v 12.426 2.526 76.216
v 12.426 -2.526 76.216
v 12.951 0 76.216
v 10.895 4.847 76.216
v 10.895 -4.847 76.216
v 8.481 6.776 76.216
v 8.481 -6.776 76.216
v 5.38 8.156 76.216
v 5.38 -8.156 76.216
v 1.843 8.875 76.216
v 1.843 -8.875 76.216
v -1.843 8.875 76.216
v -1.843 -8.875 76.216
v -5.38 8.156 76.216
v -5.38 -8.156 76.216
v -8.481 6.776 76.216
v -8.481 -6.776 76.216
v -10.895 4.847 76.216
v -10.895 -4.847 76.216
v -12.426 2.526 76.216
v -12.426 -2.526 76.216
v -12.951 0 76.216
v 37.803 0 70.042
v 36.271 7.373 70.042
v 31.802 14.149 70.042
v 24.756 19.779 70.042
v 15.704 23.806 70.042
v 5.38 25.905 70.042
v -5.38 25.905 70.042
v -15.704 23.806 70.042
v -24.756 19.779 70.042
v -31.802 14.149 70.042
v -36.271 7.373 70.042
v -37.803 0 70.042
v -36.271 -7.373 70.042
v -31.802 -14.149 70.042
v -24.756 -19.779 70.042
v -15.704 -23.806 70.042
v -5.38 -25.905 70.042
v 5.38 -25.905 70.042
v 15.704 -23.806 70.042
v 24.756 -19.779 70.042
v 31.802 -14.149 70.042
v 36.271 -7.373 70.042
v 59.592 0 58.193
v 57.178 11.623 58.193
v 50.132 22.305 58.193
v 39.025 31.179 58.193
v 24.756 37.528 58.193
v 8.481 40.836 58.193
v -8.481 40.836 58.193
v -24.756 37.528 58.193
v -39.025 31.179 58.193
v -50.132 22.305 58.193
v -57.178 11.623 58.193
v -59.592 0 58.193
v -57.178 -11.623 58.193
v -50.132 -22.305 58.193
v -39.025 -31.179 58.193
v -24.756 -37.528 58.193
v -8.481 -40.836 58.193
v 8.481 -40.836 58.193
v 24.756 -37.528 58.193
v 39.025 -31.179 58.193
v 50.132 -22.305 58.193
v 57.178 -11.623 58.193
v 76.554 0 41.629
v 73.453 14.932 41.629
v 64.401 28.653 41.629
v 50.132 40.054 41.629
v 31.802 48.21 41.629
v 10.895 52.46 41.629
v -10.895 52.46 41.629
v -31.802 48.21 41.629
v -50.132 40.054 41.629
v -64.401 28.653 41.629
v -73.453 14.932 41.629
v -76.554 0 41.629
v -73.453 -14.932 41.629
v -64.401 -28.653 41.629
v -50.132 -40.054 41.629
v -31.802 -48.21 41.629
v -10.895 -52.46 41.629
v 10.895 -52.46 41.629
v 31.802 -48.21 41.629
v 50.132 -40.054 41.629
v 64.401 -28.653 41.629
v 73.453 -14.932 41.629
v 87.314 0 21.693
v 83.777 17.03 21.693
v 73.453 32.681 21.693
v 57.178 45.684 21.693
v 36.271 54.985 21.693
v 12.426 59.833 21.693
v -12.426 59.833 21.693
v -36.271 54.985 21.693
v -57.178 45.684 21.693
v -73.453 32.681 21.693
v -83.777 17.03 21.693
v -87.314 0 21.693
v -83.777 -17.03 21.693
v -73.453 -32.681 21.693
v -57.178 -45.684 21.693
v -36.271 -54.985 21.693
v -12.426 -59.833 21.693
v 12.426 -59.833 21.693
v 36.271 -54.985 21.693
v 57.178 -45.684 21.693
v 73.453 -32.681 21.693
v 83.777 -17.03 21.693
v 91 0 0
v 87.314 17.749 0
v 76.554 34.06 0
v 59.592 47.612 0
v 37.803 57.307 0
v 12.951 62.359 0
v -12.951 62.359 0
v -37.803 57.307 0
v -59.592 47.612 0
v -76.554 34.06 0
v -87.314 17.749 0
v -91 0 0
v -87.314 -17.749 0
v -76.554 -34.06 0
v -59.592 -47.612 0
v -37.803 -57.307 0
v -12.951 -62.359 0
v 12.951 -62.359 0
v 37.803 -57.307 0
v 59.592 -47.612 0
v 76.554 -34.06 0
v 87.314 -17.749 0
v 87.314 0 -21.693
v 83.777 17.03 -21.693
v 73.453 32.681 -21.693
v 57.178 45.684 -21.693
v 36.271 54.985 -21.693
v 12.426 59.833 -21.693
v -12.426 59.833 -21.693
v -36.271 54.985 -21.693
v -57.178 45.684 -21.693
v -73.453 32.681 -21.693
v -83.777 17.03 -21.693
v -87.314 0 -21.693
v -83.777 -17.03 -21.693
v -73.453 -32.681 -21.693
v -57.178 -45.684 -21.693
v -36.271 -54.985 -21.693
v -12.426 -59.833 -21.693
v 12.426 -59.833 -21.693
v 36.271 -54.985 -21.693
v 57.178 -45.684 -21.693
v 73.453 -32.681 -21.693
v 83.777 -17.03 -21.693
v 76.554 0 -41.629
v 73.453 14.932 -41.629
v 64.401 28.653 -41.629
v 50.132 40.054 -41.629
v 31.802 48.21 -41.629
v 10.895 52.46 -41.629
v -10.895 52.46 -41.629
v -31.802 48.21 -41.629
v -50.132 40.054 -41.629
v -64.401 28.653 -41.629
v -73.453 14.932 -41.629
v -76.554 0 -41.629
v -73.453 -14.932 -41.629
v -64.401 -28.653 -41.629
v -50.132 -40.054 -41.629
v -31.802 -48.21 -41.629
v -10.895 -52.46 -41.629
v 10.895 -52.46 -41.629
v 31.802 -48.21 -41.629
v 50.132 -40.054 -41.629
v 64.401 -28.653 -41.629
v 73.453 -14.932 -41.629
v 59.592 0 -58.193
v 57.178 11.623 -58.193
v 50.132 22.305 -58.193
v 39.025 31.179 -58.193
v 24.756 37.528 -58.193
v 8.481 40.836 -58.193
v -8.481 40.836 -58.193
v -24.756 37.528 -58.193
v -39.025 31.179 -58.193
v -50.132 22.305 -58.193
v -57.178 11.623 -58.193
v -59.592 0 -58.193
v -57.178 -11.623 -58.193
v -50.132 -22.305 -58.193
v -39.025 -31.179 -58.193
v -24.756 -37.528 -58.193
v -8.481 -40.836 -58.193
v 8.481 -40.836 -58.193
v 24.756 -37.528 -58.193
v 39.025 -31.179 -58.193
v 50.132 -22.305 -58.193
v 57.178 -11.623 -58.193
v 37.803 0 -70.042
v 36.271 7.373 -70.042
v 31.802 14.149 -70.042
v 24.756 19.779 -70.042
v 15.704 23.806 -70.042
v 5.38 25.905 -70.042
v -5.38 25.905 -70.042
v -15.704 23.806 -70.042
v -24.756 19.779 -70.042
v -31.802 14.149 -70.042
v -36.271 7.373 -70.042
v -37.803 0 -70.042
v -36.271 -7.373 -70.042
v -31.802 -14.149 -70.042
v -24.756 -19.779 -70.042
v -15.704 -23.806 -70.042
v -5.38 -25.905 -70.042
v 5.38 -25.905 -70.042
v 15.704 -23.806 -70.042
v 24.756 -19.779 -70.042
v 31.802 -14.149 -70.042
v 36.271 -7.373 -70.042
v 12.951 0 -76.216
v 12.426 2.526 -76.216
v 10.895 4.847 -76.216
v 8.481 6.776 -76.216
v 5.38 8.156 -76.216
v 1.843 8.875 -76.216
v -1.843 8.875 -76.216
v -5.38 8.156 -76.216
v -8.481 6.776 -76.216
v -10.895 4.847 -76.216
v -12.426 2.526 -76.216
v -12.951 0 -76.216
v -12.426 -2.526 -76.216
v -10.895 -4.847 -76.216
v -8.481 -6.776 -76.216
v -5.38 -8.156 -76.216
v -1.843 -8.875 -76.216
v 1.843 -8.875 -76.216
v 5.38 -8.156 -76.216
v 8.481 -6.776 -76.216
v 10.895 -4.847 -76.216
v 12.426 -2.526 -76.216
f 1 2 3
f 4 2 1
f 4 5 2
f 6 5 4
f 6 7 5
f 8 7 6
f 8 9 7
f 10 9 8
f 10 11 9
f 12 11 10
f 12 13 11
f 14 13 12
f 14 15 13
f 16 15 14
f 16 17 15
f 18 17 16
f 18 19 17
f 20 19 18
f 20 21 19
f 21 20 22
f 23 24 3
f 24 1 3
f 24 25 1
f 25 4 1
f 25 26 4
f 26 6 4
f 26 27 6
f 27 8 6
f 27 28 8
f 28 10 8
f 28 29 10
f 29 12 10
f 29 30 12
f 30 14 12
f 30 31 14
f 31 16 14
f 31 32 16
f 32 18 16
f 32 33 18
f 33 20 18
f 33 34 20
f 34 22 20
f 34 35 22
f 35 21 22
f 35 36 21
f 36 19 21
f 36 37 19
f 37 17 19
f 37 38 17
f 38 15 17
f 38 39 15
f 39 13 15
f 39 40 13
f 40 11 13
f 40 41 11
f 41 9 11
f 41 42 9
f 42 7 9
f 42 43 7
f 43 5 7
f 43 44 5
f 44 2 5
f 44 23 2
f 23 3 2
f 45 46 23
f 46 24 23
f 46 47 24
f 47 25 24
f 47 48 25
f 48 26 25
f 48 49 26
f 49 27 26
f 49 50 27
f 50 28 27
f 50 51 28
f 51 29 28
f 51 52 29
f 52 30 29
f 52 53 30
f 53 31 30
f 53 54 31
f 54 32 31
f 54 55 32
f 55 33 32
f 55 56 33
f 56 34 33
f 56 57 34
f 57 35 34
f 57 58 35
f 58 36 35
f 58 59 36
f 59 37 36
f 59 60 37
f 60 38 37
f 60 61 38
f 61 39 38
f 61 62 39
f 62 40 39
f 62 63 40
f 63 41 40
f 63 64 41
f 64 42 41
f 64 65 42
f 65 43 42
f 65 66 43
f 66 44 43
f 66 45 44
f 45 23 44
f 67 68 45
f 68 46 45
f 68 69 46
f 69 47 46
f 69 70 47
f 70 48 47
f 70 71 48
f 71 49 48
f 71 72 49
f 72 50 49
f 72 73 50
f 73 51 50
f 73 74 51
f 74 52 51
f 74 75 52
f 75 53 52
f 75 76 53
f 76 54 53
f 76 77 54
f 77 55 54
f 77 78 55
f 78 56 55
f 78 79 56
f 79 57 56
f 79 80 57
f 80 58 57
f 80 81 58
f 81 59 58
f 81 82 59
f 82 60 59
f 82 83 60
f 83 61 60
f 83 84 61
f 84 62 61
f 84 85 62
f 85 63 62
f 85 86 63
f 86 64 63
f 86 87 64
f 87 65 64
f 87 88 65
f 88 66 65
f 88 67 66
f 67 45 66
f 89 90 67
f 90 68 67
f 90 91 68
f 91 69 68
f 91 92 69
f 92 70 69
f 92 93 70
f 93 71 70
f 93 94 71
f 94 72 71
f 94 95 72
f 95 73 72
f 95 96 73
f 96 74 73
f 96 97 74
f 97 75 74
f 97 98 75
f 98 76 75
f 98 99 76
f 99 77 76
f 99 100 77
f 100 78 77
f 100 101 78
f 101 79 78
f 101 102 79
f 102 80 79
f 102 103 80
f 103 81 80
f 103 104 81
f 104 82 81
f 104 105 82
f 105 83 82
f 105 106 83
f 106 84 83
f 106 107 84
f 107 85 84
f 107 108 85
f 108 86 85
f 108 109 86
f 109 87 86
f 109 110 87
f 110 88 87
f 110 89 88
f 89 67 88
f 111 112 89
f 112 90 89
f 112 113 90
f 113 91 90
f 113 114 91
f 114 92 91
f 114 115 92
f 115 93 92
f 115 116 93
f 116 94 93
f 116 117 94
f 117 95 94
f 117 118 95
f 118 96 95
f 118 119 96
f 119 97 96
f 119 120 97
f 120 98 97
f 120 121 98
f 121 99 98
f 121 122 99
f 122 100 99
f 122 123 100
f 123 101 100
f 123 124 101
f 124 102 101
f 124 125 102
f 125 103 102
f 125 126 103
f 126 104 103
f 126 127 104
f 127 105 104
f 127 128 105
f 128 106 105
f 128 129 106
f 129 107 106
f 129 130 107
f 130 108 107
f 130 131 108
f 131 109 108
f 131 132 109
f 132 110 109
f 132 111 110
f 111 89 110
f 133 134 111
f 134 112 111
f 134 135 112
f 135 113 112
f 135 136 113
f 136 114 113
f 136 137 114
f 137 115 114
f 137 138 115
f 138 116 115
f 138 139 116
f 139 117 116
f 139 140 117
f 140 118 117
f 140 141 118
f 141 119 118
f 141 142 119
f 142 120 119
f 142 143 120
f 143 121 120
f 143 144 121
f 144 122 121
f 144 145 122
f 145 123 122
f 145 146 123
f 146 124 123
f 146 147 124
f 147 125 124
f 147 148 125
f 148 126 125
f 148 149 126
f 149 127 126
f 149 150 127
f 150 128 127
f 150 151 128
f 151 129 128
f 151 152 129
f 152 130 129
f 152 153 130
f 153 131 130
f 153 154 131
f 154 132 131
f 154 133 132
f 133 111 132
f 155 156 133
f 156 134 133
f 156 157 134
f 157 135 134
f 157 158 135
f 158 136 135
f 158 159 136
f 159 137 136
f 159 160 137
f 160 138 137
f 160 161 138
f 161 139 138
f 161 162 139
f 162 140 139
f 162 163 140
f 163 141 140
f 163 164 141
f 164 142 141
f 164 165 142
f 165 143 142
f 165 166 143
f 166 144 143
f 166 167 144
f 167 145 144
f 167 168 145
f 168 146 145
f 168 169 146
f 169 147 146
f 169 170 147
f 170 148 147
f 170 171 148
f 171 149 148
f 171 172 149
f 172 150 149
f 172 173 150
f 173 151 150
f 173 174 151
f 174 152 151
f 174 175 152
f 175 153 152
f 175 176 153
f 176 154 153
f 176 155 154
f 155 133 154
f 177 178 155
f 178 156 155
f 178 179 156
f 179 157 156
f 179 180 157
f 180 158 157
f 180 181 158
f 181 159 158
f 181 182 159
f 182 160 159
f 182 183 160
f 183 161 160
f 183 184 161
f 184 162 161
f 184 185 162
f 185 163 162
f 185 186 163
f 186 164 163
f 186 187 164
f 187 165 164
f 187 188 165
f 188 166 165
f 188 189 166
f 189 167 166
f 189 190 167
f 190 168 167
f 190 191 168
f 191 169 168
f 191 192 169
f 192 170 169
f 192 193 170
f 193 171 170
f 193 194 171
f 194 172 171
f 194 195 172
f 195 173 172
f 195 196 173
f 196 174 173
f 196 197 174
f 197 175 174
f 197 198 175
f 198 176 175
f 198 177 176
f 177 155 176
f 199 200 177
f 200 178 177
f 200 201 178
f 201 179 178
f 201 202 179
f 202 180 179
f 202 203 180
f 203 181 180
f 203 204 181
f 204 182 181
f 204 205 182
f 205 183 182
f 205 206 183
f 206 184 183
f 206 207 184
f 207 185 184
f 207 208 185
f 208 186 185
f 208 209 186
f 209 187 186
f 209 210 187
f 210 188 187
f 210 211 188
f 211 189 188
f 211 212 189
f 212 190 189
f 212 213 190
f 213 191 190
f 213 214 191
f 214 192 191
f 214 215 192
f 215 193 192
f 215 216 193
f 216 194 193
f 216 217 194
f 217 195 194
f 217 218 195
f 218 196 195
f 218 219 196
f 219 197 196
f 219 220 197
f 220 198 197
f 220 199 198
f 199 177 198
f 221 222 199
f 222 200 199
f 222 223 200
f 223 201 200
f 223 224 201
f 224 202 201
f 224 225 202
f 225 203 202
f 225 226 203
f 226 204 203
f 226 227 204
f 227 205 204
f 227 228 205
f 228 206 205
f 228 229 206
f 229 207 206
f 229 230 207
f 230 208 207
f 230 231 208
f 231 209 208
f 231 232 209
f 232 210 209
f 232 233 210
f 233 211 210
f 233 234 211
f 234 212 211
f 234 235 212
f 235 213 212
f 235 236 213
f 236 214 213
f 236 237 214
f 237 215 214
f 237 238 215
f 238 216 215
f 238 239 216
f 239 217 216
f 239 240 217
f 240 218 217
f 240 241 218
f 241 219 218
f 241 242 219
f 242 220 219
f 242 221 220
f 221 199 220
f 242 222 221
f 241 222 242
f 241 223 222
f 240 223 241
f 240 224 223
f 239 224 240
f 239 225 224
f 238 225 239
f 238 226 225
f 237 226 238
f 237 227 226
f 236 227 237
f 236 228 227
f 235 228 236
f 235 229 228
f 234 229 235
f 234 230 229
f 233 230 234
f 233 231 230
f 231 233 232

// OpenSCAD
// Generated by SolidPython 1.0.1 on 2020-07-29 00:46:50


scale(v = [13, 9, 11]) {
	sphere(r = 7);
}
/***********************************************
*********      SolidPython code:      **********
************************************************
 
# import packages: SolidPython
from solid import *
from solid.utils import *
from itertools import chain, combinations, permutations


class Resize:

    def __init__(self, scad_file):
        self.scad_file = scad_file
        #self.scad_file = import_scad(scad_file)
        # cone/cylinder param:
        self.r1 = 0
        self.r2 = 0
        self.h = 0
        # rectangular prism param:
        self.w = 0
        self.l = 0
        # ellipse param:
        self.r = 0

    # import OpenScad code (file name corresponds to shape)


    # classify shape + parameters
    def assign(self, param1, param2, param3):
        if self.scad_file == 'cone.scad':
            self.r1 = param1
            self.r2 = param2
            self.h = param3
        elif self.scad_file == 'cylinder.scad':
            self.r1 = param1
            self.r2 = param2
            self.h = param3
        elif self.scad_file == 'rectangularPrism.scad':
            self.h = param1
            self.l = param2
            self.w = param3
        else:
            self.r = param1
            self.h = param2

    # resize parameters
    def iterate(self):
        x = range(3, 20, 2)
        i = 1
        if self.scad_file == 'cone.scad':
            tempList = list(permutations(x, 2))
            for temp in tempList:
                param1 = temp[0]
                param2 = temp[1]
                filepath = 'produced_scad_files/' + 'cone' + str(param1) + '_' + str(param2) + '_' + '.scad'
                scad_render_to_file(cylinder(h=param1, r1=param2, r2=0), filepath)

        elif self.scad_file == 'cylinder.scad':
            tempList = list(permutations(x, 3))
            for temp in tempList:
                param1 = temp[0]
                param2 = temp[1]
                filepath = 'produced_scad_files/' + 'cylinder' + str(param1) + '_' + str(param2) + '_' + '.scad'
                scad_render_to_file(cylinder(h=param1, r1=param2, r2=param2), filepath)

        elif self.scad_file == 'rectangularPrism.scad':
            tempList = list(permutations(x, 3))
            for temp in tempList:
                param1 = temp[0]
                param2 = temp[1]
                param3 = temp[2]
                filepath = 'produced_scad_files/' + 'rectangularPrism' + str(param1) + '_' + str(param2) + '_' + str(
                    param3) + '.scad'
                scad_render_to_file(cube(size=(param1, param2, param3)), filepath)

        elif self.scad_file == 'ellipse.scad':
            tempList = list(permutations(x, 4))
            for temp in tempList:
                param1 = temp[0]
                param2 = temp[1]
                param3 = temp[2]
                param4 = temp[3]
                filepath = 'produced_scad_files/' + 'ellipse' + str(param1) + '_' + str(param2) + '_' + str(param3) + '_' + str(param4) + '.scad'
                scad_render_to_file(scale([param1, param2, param3])(sphere(r=param4)), filepath)

    def render_to_scadfile(self):
        scad_render_to_file(scad, 'example.scad') 
 
************************************************/
